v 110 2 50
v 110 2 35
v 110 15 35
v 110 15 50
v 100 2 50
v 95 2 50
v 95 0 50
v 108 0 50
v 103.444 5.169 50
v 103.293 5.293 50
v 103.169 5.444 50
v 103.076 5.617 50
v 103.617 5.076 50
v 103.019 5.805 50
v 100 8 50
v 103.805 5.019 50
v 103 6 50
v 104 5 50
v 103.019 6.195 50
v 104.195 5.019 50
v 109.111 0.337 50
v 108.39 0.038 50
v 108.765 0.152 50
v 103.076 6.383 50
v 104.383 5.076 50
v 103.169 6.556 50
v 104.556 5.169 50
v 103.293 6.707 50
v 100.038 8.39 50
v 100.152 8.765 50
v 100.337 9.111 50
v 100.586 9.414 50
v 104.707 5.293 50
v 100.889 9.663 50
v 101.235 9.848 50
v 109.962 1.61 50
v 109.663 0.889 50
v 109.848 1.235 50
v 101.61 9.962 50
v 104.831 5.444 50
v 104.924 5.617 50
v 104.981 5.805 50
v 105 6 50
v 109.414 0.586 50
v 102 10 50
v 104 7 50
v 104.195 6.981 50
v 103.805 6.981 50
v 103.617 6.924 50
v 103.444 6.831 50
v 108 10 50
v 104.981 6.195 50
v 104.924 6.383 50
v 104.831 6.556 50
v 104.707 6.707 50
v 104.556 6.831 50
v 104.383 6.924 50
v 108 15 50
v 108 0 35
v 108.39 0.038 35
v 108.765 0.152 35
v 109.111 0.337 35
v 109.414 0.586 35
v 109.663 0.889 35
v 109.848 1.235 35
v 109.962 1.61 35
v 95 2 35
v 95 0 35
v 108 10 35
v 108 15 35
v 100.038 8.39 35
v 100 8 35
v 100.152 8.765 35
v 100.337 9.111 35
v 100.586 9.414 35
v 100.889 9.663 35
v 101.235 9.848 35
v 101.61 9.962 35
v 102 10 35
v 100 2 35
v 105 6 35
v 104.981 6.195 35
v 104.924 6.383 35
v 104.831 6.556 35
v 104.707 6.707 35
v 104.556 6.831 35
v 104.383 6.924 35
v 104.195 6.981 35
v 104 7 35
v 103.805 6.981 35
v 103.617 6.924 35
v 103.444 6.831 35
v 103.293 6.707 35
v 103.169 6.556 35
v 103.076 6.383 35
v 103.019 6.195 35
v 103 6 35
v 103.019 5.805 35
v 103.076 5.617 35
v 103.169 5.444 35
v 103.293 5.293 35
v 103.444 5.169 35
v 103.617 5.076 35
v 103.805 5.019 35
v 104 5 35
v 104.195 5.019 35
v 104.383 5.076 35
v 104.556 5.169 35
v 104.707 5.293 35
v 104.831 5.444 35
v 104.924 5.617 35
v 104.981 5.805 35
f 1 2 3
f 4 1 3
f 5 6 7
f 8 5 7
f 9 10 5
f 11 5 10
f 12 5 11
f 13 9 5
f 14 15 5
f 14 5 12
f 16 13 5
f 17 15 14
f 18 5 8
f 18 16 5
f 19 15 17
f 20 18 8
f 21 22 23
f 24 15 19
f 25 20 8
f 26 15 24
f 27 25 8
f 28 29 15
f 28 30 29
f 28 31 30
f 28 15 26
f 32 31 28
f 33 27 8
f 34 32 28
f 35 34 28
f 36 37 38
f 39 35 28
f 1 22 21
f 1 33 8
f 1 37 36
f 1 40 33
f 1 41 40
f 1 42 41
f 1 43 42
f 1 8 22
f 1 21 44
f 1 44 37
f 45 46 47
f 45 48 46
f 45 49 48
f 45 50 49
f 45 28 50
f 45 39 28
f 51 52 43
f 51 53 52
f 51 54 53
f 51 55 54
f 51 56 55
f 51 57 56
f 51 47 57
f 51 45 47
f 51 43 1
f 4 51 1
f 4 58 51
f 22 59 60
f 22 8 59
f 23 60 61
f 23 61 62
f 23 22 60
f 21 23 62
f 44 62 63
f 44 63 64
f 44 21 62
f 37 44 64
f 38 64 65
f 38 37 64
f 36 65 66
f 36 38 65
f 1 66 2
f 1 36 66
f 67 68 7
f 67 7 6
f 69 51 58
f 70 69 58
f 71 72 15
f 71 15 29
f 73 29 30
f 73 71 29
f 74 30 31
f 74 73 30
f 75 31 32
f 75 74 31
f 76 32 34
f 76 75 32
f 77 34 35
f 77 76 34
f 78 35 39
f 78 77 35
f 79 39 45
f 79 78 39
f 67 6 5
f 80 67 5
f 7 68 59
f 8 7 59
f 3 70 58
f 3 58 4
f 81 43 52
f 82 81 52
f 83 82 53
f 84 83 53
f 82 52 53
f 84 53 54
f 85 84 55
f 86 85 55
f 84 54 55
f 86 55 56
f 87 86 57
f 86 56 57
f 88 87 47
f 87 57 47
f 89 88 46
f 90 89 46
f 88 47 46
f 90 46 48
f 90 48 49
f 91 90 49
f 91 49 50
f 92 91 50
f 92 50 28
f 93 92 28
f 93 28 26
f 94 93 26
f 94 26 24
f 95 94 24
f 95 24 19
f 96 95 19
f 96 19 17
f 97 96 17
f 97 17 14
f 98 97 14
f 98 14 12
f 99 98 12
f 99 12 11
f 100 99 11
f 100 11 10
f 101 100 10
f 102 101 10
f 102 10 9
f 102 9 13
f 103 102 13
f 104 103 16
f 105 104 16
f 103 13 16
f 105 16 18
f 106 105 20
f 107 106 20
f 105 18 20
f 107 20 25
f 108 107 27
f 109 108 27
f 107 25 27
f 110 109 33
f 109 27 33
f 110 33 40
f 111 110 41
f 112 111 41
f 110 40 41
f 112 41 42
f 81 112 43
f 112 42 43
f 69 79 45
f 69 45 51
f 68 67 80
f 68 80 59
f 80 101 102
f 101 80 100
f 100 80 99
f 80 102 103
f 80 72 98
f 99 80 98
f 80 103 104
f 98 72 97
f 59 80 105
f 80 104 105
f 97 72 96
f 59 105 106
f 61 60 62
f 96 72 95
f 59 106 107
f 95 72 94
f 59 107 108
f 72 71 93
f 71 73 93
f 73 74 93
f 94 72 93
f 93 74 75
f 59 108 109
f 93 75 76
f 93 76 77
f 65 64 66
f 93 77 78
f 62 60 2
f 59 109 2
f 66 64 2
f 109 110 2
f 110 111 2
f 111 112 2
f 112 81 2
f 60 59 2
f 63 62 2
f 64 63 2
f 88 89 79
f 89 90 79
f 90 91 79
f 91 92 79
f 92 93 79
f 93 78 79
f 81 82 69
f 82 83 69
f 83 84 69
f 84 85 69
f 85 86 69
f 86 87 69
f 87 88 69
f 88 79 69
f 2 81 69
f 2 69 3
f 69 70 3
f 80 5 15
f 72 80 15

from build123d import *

# Parameters (mm, degrees)
SKETCH_W        = 110
SKETCH_H        = 80
PAD_DEPTH       = 50
SKETCH001_R     = 1
POCKET_DEPTH    = 48
FILLET_R        = 2
FILLET001_R     = 2
SKETCH002_R     = 2.55
SKETCH002_W     = 11.5
SKETCH002_H     = 19.1
POCKET001_DEPTH = 5
SKETCH003_R     = 2.55
POCKET002_DEPTH = 5
BOX_W           = 15
BOX_H           = 15
BOX_DEPTH       = 15


with BuildPart() as body:
    # Sketch → Pad (new body)
    with BuildSketch(Plane.XY):
        with Locations((55, 40)):
            Rectangle(SKETCH_W, SKETCH_H)
    extrude(amount=PAD_DEPTH)

    # Sketch001 (on Face6 of Pad) → Pocket (cut)
    with BuildSketch(Plane.XY.offset(50)):
        with Locations((6, 74)):
            Circle(SKETCH001_R)
        with Locations((104, 74)):
            Circle(SKETCH001_R)
        with Locations((104, 6)):
            Circle(SKETCH001_R)
        with Locations((6, 6)):
            Circle(SKETCH001_R)
        Polygon((2, 10), (10, 10), (10, 2), (100, 2), (100, 10), (108, 10), (108, 70), (100, 70), (100, 78), (10, 78), (10, 70), (2, 70), align=None)
    extrude(amount=-POCKET_DEPTH, mode=Mode.SUBTRACT)

    # Fillet
    fillet_edges = [body.edges().sort_by_distance(p)[0] for p in [
        (0, 80, 25),
        (0, 40, 0),
        (0, 0, 25),
        (55, 0, 0),
        (110, 0, 25),
        (110, 80, 25),
        (110, 40, 0),
        (55, 80, 0),
    ]]
    fillet(fillet_edges, radius=FILLET_R)

    # Fillet001
    fillet001_edges = [body.edges().sort_by_distance(p)[0] for p in [
        (100, 10, 26),
        (100, 70, 26),
        (10, 70, 26),
        (10, 10, 26),
    ]]
    fillet(fillet001_edges, radius=FILLET001_R)

    # Sketch002 (on Face22 of Fillet001) → Pocket001 (cut)
    with BuildSketch(Plane.YZ.offset(110)):
        with Locations((15, 27.5)):
            Circle(SKETCH002_R)
        with Locations((28.75, 27.5)):
            Rectangle(SKETCH002_W, SKETCH002_H)
    extrude(amount=-POCKET001_DEPTH, mode=Mode.SUBTRACT)

    # Sketch003 (on Face18 of Pocket001) → Pocket002 (cut)
    with BuildSketch(Plane.XZ):
        with Locations((95, 27.5)):
            Circle(SKETCH003_R)
    extrude(amount=-POCKET002_DEPTH, mode=Mode.SUBTRACT)


with BuildPart() as common:
    # Box → Box (new body)
    with BuildSketch(Plane(origin=(95, 0, 35), x_dir=(1, 0, 0), z_dir=(0, 0, 1))):
        with Locations((7.5, 7.5)):
            Rectangle(BOX_W, BOX_H)
    extrude(amount=BOX_DEPTH)

    # Common: intersect Body
    add(body.part, mode=Mode.INTERSECT)


solid = common.part
